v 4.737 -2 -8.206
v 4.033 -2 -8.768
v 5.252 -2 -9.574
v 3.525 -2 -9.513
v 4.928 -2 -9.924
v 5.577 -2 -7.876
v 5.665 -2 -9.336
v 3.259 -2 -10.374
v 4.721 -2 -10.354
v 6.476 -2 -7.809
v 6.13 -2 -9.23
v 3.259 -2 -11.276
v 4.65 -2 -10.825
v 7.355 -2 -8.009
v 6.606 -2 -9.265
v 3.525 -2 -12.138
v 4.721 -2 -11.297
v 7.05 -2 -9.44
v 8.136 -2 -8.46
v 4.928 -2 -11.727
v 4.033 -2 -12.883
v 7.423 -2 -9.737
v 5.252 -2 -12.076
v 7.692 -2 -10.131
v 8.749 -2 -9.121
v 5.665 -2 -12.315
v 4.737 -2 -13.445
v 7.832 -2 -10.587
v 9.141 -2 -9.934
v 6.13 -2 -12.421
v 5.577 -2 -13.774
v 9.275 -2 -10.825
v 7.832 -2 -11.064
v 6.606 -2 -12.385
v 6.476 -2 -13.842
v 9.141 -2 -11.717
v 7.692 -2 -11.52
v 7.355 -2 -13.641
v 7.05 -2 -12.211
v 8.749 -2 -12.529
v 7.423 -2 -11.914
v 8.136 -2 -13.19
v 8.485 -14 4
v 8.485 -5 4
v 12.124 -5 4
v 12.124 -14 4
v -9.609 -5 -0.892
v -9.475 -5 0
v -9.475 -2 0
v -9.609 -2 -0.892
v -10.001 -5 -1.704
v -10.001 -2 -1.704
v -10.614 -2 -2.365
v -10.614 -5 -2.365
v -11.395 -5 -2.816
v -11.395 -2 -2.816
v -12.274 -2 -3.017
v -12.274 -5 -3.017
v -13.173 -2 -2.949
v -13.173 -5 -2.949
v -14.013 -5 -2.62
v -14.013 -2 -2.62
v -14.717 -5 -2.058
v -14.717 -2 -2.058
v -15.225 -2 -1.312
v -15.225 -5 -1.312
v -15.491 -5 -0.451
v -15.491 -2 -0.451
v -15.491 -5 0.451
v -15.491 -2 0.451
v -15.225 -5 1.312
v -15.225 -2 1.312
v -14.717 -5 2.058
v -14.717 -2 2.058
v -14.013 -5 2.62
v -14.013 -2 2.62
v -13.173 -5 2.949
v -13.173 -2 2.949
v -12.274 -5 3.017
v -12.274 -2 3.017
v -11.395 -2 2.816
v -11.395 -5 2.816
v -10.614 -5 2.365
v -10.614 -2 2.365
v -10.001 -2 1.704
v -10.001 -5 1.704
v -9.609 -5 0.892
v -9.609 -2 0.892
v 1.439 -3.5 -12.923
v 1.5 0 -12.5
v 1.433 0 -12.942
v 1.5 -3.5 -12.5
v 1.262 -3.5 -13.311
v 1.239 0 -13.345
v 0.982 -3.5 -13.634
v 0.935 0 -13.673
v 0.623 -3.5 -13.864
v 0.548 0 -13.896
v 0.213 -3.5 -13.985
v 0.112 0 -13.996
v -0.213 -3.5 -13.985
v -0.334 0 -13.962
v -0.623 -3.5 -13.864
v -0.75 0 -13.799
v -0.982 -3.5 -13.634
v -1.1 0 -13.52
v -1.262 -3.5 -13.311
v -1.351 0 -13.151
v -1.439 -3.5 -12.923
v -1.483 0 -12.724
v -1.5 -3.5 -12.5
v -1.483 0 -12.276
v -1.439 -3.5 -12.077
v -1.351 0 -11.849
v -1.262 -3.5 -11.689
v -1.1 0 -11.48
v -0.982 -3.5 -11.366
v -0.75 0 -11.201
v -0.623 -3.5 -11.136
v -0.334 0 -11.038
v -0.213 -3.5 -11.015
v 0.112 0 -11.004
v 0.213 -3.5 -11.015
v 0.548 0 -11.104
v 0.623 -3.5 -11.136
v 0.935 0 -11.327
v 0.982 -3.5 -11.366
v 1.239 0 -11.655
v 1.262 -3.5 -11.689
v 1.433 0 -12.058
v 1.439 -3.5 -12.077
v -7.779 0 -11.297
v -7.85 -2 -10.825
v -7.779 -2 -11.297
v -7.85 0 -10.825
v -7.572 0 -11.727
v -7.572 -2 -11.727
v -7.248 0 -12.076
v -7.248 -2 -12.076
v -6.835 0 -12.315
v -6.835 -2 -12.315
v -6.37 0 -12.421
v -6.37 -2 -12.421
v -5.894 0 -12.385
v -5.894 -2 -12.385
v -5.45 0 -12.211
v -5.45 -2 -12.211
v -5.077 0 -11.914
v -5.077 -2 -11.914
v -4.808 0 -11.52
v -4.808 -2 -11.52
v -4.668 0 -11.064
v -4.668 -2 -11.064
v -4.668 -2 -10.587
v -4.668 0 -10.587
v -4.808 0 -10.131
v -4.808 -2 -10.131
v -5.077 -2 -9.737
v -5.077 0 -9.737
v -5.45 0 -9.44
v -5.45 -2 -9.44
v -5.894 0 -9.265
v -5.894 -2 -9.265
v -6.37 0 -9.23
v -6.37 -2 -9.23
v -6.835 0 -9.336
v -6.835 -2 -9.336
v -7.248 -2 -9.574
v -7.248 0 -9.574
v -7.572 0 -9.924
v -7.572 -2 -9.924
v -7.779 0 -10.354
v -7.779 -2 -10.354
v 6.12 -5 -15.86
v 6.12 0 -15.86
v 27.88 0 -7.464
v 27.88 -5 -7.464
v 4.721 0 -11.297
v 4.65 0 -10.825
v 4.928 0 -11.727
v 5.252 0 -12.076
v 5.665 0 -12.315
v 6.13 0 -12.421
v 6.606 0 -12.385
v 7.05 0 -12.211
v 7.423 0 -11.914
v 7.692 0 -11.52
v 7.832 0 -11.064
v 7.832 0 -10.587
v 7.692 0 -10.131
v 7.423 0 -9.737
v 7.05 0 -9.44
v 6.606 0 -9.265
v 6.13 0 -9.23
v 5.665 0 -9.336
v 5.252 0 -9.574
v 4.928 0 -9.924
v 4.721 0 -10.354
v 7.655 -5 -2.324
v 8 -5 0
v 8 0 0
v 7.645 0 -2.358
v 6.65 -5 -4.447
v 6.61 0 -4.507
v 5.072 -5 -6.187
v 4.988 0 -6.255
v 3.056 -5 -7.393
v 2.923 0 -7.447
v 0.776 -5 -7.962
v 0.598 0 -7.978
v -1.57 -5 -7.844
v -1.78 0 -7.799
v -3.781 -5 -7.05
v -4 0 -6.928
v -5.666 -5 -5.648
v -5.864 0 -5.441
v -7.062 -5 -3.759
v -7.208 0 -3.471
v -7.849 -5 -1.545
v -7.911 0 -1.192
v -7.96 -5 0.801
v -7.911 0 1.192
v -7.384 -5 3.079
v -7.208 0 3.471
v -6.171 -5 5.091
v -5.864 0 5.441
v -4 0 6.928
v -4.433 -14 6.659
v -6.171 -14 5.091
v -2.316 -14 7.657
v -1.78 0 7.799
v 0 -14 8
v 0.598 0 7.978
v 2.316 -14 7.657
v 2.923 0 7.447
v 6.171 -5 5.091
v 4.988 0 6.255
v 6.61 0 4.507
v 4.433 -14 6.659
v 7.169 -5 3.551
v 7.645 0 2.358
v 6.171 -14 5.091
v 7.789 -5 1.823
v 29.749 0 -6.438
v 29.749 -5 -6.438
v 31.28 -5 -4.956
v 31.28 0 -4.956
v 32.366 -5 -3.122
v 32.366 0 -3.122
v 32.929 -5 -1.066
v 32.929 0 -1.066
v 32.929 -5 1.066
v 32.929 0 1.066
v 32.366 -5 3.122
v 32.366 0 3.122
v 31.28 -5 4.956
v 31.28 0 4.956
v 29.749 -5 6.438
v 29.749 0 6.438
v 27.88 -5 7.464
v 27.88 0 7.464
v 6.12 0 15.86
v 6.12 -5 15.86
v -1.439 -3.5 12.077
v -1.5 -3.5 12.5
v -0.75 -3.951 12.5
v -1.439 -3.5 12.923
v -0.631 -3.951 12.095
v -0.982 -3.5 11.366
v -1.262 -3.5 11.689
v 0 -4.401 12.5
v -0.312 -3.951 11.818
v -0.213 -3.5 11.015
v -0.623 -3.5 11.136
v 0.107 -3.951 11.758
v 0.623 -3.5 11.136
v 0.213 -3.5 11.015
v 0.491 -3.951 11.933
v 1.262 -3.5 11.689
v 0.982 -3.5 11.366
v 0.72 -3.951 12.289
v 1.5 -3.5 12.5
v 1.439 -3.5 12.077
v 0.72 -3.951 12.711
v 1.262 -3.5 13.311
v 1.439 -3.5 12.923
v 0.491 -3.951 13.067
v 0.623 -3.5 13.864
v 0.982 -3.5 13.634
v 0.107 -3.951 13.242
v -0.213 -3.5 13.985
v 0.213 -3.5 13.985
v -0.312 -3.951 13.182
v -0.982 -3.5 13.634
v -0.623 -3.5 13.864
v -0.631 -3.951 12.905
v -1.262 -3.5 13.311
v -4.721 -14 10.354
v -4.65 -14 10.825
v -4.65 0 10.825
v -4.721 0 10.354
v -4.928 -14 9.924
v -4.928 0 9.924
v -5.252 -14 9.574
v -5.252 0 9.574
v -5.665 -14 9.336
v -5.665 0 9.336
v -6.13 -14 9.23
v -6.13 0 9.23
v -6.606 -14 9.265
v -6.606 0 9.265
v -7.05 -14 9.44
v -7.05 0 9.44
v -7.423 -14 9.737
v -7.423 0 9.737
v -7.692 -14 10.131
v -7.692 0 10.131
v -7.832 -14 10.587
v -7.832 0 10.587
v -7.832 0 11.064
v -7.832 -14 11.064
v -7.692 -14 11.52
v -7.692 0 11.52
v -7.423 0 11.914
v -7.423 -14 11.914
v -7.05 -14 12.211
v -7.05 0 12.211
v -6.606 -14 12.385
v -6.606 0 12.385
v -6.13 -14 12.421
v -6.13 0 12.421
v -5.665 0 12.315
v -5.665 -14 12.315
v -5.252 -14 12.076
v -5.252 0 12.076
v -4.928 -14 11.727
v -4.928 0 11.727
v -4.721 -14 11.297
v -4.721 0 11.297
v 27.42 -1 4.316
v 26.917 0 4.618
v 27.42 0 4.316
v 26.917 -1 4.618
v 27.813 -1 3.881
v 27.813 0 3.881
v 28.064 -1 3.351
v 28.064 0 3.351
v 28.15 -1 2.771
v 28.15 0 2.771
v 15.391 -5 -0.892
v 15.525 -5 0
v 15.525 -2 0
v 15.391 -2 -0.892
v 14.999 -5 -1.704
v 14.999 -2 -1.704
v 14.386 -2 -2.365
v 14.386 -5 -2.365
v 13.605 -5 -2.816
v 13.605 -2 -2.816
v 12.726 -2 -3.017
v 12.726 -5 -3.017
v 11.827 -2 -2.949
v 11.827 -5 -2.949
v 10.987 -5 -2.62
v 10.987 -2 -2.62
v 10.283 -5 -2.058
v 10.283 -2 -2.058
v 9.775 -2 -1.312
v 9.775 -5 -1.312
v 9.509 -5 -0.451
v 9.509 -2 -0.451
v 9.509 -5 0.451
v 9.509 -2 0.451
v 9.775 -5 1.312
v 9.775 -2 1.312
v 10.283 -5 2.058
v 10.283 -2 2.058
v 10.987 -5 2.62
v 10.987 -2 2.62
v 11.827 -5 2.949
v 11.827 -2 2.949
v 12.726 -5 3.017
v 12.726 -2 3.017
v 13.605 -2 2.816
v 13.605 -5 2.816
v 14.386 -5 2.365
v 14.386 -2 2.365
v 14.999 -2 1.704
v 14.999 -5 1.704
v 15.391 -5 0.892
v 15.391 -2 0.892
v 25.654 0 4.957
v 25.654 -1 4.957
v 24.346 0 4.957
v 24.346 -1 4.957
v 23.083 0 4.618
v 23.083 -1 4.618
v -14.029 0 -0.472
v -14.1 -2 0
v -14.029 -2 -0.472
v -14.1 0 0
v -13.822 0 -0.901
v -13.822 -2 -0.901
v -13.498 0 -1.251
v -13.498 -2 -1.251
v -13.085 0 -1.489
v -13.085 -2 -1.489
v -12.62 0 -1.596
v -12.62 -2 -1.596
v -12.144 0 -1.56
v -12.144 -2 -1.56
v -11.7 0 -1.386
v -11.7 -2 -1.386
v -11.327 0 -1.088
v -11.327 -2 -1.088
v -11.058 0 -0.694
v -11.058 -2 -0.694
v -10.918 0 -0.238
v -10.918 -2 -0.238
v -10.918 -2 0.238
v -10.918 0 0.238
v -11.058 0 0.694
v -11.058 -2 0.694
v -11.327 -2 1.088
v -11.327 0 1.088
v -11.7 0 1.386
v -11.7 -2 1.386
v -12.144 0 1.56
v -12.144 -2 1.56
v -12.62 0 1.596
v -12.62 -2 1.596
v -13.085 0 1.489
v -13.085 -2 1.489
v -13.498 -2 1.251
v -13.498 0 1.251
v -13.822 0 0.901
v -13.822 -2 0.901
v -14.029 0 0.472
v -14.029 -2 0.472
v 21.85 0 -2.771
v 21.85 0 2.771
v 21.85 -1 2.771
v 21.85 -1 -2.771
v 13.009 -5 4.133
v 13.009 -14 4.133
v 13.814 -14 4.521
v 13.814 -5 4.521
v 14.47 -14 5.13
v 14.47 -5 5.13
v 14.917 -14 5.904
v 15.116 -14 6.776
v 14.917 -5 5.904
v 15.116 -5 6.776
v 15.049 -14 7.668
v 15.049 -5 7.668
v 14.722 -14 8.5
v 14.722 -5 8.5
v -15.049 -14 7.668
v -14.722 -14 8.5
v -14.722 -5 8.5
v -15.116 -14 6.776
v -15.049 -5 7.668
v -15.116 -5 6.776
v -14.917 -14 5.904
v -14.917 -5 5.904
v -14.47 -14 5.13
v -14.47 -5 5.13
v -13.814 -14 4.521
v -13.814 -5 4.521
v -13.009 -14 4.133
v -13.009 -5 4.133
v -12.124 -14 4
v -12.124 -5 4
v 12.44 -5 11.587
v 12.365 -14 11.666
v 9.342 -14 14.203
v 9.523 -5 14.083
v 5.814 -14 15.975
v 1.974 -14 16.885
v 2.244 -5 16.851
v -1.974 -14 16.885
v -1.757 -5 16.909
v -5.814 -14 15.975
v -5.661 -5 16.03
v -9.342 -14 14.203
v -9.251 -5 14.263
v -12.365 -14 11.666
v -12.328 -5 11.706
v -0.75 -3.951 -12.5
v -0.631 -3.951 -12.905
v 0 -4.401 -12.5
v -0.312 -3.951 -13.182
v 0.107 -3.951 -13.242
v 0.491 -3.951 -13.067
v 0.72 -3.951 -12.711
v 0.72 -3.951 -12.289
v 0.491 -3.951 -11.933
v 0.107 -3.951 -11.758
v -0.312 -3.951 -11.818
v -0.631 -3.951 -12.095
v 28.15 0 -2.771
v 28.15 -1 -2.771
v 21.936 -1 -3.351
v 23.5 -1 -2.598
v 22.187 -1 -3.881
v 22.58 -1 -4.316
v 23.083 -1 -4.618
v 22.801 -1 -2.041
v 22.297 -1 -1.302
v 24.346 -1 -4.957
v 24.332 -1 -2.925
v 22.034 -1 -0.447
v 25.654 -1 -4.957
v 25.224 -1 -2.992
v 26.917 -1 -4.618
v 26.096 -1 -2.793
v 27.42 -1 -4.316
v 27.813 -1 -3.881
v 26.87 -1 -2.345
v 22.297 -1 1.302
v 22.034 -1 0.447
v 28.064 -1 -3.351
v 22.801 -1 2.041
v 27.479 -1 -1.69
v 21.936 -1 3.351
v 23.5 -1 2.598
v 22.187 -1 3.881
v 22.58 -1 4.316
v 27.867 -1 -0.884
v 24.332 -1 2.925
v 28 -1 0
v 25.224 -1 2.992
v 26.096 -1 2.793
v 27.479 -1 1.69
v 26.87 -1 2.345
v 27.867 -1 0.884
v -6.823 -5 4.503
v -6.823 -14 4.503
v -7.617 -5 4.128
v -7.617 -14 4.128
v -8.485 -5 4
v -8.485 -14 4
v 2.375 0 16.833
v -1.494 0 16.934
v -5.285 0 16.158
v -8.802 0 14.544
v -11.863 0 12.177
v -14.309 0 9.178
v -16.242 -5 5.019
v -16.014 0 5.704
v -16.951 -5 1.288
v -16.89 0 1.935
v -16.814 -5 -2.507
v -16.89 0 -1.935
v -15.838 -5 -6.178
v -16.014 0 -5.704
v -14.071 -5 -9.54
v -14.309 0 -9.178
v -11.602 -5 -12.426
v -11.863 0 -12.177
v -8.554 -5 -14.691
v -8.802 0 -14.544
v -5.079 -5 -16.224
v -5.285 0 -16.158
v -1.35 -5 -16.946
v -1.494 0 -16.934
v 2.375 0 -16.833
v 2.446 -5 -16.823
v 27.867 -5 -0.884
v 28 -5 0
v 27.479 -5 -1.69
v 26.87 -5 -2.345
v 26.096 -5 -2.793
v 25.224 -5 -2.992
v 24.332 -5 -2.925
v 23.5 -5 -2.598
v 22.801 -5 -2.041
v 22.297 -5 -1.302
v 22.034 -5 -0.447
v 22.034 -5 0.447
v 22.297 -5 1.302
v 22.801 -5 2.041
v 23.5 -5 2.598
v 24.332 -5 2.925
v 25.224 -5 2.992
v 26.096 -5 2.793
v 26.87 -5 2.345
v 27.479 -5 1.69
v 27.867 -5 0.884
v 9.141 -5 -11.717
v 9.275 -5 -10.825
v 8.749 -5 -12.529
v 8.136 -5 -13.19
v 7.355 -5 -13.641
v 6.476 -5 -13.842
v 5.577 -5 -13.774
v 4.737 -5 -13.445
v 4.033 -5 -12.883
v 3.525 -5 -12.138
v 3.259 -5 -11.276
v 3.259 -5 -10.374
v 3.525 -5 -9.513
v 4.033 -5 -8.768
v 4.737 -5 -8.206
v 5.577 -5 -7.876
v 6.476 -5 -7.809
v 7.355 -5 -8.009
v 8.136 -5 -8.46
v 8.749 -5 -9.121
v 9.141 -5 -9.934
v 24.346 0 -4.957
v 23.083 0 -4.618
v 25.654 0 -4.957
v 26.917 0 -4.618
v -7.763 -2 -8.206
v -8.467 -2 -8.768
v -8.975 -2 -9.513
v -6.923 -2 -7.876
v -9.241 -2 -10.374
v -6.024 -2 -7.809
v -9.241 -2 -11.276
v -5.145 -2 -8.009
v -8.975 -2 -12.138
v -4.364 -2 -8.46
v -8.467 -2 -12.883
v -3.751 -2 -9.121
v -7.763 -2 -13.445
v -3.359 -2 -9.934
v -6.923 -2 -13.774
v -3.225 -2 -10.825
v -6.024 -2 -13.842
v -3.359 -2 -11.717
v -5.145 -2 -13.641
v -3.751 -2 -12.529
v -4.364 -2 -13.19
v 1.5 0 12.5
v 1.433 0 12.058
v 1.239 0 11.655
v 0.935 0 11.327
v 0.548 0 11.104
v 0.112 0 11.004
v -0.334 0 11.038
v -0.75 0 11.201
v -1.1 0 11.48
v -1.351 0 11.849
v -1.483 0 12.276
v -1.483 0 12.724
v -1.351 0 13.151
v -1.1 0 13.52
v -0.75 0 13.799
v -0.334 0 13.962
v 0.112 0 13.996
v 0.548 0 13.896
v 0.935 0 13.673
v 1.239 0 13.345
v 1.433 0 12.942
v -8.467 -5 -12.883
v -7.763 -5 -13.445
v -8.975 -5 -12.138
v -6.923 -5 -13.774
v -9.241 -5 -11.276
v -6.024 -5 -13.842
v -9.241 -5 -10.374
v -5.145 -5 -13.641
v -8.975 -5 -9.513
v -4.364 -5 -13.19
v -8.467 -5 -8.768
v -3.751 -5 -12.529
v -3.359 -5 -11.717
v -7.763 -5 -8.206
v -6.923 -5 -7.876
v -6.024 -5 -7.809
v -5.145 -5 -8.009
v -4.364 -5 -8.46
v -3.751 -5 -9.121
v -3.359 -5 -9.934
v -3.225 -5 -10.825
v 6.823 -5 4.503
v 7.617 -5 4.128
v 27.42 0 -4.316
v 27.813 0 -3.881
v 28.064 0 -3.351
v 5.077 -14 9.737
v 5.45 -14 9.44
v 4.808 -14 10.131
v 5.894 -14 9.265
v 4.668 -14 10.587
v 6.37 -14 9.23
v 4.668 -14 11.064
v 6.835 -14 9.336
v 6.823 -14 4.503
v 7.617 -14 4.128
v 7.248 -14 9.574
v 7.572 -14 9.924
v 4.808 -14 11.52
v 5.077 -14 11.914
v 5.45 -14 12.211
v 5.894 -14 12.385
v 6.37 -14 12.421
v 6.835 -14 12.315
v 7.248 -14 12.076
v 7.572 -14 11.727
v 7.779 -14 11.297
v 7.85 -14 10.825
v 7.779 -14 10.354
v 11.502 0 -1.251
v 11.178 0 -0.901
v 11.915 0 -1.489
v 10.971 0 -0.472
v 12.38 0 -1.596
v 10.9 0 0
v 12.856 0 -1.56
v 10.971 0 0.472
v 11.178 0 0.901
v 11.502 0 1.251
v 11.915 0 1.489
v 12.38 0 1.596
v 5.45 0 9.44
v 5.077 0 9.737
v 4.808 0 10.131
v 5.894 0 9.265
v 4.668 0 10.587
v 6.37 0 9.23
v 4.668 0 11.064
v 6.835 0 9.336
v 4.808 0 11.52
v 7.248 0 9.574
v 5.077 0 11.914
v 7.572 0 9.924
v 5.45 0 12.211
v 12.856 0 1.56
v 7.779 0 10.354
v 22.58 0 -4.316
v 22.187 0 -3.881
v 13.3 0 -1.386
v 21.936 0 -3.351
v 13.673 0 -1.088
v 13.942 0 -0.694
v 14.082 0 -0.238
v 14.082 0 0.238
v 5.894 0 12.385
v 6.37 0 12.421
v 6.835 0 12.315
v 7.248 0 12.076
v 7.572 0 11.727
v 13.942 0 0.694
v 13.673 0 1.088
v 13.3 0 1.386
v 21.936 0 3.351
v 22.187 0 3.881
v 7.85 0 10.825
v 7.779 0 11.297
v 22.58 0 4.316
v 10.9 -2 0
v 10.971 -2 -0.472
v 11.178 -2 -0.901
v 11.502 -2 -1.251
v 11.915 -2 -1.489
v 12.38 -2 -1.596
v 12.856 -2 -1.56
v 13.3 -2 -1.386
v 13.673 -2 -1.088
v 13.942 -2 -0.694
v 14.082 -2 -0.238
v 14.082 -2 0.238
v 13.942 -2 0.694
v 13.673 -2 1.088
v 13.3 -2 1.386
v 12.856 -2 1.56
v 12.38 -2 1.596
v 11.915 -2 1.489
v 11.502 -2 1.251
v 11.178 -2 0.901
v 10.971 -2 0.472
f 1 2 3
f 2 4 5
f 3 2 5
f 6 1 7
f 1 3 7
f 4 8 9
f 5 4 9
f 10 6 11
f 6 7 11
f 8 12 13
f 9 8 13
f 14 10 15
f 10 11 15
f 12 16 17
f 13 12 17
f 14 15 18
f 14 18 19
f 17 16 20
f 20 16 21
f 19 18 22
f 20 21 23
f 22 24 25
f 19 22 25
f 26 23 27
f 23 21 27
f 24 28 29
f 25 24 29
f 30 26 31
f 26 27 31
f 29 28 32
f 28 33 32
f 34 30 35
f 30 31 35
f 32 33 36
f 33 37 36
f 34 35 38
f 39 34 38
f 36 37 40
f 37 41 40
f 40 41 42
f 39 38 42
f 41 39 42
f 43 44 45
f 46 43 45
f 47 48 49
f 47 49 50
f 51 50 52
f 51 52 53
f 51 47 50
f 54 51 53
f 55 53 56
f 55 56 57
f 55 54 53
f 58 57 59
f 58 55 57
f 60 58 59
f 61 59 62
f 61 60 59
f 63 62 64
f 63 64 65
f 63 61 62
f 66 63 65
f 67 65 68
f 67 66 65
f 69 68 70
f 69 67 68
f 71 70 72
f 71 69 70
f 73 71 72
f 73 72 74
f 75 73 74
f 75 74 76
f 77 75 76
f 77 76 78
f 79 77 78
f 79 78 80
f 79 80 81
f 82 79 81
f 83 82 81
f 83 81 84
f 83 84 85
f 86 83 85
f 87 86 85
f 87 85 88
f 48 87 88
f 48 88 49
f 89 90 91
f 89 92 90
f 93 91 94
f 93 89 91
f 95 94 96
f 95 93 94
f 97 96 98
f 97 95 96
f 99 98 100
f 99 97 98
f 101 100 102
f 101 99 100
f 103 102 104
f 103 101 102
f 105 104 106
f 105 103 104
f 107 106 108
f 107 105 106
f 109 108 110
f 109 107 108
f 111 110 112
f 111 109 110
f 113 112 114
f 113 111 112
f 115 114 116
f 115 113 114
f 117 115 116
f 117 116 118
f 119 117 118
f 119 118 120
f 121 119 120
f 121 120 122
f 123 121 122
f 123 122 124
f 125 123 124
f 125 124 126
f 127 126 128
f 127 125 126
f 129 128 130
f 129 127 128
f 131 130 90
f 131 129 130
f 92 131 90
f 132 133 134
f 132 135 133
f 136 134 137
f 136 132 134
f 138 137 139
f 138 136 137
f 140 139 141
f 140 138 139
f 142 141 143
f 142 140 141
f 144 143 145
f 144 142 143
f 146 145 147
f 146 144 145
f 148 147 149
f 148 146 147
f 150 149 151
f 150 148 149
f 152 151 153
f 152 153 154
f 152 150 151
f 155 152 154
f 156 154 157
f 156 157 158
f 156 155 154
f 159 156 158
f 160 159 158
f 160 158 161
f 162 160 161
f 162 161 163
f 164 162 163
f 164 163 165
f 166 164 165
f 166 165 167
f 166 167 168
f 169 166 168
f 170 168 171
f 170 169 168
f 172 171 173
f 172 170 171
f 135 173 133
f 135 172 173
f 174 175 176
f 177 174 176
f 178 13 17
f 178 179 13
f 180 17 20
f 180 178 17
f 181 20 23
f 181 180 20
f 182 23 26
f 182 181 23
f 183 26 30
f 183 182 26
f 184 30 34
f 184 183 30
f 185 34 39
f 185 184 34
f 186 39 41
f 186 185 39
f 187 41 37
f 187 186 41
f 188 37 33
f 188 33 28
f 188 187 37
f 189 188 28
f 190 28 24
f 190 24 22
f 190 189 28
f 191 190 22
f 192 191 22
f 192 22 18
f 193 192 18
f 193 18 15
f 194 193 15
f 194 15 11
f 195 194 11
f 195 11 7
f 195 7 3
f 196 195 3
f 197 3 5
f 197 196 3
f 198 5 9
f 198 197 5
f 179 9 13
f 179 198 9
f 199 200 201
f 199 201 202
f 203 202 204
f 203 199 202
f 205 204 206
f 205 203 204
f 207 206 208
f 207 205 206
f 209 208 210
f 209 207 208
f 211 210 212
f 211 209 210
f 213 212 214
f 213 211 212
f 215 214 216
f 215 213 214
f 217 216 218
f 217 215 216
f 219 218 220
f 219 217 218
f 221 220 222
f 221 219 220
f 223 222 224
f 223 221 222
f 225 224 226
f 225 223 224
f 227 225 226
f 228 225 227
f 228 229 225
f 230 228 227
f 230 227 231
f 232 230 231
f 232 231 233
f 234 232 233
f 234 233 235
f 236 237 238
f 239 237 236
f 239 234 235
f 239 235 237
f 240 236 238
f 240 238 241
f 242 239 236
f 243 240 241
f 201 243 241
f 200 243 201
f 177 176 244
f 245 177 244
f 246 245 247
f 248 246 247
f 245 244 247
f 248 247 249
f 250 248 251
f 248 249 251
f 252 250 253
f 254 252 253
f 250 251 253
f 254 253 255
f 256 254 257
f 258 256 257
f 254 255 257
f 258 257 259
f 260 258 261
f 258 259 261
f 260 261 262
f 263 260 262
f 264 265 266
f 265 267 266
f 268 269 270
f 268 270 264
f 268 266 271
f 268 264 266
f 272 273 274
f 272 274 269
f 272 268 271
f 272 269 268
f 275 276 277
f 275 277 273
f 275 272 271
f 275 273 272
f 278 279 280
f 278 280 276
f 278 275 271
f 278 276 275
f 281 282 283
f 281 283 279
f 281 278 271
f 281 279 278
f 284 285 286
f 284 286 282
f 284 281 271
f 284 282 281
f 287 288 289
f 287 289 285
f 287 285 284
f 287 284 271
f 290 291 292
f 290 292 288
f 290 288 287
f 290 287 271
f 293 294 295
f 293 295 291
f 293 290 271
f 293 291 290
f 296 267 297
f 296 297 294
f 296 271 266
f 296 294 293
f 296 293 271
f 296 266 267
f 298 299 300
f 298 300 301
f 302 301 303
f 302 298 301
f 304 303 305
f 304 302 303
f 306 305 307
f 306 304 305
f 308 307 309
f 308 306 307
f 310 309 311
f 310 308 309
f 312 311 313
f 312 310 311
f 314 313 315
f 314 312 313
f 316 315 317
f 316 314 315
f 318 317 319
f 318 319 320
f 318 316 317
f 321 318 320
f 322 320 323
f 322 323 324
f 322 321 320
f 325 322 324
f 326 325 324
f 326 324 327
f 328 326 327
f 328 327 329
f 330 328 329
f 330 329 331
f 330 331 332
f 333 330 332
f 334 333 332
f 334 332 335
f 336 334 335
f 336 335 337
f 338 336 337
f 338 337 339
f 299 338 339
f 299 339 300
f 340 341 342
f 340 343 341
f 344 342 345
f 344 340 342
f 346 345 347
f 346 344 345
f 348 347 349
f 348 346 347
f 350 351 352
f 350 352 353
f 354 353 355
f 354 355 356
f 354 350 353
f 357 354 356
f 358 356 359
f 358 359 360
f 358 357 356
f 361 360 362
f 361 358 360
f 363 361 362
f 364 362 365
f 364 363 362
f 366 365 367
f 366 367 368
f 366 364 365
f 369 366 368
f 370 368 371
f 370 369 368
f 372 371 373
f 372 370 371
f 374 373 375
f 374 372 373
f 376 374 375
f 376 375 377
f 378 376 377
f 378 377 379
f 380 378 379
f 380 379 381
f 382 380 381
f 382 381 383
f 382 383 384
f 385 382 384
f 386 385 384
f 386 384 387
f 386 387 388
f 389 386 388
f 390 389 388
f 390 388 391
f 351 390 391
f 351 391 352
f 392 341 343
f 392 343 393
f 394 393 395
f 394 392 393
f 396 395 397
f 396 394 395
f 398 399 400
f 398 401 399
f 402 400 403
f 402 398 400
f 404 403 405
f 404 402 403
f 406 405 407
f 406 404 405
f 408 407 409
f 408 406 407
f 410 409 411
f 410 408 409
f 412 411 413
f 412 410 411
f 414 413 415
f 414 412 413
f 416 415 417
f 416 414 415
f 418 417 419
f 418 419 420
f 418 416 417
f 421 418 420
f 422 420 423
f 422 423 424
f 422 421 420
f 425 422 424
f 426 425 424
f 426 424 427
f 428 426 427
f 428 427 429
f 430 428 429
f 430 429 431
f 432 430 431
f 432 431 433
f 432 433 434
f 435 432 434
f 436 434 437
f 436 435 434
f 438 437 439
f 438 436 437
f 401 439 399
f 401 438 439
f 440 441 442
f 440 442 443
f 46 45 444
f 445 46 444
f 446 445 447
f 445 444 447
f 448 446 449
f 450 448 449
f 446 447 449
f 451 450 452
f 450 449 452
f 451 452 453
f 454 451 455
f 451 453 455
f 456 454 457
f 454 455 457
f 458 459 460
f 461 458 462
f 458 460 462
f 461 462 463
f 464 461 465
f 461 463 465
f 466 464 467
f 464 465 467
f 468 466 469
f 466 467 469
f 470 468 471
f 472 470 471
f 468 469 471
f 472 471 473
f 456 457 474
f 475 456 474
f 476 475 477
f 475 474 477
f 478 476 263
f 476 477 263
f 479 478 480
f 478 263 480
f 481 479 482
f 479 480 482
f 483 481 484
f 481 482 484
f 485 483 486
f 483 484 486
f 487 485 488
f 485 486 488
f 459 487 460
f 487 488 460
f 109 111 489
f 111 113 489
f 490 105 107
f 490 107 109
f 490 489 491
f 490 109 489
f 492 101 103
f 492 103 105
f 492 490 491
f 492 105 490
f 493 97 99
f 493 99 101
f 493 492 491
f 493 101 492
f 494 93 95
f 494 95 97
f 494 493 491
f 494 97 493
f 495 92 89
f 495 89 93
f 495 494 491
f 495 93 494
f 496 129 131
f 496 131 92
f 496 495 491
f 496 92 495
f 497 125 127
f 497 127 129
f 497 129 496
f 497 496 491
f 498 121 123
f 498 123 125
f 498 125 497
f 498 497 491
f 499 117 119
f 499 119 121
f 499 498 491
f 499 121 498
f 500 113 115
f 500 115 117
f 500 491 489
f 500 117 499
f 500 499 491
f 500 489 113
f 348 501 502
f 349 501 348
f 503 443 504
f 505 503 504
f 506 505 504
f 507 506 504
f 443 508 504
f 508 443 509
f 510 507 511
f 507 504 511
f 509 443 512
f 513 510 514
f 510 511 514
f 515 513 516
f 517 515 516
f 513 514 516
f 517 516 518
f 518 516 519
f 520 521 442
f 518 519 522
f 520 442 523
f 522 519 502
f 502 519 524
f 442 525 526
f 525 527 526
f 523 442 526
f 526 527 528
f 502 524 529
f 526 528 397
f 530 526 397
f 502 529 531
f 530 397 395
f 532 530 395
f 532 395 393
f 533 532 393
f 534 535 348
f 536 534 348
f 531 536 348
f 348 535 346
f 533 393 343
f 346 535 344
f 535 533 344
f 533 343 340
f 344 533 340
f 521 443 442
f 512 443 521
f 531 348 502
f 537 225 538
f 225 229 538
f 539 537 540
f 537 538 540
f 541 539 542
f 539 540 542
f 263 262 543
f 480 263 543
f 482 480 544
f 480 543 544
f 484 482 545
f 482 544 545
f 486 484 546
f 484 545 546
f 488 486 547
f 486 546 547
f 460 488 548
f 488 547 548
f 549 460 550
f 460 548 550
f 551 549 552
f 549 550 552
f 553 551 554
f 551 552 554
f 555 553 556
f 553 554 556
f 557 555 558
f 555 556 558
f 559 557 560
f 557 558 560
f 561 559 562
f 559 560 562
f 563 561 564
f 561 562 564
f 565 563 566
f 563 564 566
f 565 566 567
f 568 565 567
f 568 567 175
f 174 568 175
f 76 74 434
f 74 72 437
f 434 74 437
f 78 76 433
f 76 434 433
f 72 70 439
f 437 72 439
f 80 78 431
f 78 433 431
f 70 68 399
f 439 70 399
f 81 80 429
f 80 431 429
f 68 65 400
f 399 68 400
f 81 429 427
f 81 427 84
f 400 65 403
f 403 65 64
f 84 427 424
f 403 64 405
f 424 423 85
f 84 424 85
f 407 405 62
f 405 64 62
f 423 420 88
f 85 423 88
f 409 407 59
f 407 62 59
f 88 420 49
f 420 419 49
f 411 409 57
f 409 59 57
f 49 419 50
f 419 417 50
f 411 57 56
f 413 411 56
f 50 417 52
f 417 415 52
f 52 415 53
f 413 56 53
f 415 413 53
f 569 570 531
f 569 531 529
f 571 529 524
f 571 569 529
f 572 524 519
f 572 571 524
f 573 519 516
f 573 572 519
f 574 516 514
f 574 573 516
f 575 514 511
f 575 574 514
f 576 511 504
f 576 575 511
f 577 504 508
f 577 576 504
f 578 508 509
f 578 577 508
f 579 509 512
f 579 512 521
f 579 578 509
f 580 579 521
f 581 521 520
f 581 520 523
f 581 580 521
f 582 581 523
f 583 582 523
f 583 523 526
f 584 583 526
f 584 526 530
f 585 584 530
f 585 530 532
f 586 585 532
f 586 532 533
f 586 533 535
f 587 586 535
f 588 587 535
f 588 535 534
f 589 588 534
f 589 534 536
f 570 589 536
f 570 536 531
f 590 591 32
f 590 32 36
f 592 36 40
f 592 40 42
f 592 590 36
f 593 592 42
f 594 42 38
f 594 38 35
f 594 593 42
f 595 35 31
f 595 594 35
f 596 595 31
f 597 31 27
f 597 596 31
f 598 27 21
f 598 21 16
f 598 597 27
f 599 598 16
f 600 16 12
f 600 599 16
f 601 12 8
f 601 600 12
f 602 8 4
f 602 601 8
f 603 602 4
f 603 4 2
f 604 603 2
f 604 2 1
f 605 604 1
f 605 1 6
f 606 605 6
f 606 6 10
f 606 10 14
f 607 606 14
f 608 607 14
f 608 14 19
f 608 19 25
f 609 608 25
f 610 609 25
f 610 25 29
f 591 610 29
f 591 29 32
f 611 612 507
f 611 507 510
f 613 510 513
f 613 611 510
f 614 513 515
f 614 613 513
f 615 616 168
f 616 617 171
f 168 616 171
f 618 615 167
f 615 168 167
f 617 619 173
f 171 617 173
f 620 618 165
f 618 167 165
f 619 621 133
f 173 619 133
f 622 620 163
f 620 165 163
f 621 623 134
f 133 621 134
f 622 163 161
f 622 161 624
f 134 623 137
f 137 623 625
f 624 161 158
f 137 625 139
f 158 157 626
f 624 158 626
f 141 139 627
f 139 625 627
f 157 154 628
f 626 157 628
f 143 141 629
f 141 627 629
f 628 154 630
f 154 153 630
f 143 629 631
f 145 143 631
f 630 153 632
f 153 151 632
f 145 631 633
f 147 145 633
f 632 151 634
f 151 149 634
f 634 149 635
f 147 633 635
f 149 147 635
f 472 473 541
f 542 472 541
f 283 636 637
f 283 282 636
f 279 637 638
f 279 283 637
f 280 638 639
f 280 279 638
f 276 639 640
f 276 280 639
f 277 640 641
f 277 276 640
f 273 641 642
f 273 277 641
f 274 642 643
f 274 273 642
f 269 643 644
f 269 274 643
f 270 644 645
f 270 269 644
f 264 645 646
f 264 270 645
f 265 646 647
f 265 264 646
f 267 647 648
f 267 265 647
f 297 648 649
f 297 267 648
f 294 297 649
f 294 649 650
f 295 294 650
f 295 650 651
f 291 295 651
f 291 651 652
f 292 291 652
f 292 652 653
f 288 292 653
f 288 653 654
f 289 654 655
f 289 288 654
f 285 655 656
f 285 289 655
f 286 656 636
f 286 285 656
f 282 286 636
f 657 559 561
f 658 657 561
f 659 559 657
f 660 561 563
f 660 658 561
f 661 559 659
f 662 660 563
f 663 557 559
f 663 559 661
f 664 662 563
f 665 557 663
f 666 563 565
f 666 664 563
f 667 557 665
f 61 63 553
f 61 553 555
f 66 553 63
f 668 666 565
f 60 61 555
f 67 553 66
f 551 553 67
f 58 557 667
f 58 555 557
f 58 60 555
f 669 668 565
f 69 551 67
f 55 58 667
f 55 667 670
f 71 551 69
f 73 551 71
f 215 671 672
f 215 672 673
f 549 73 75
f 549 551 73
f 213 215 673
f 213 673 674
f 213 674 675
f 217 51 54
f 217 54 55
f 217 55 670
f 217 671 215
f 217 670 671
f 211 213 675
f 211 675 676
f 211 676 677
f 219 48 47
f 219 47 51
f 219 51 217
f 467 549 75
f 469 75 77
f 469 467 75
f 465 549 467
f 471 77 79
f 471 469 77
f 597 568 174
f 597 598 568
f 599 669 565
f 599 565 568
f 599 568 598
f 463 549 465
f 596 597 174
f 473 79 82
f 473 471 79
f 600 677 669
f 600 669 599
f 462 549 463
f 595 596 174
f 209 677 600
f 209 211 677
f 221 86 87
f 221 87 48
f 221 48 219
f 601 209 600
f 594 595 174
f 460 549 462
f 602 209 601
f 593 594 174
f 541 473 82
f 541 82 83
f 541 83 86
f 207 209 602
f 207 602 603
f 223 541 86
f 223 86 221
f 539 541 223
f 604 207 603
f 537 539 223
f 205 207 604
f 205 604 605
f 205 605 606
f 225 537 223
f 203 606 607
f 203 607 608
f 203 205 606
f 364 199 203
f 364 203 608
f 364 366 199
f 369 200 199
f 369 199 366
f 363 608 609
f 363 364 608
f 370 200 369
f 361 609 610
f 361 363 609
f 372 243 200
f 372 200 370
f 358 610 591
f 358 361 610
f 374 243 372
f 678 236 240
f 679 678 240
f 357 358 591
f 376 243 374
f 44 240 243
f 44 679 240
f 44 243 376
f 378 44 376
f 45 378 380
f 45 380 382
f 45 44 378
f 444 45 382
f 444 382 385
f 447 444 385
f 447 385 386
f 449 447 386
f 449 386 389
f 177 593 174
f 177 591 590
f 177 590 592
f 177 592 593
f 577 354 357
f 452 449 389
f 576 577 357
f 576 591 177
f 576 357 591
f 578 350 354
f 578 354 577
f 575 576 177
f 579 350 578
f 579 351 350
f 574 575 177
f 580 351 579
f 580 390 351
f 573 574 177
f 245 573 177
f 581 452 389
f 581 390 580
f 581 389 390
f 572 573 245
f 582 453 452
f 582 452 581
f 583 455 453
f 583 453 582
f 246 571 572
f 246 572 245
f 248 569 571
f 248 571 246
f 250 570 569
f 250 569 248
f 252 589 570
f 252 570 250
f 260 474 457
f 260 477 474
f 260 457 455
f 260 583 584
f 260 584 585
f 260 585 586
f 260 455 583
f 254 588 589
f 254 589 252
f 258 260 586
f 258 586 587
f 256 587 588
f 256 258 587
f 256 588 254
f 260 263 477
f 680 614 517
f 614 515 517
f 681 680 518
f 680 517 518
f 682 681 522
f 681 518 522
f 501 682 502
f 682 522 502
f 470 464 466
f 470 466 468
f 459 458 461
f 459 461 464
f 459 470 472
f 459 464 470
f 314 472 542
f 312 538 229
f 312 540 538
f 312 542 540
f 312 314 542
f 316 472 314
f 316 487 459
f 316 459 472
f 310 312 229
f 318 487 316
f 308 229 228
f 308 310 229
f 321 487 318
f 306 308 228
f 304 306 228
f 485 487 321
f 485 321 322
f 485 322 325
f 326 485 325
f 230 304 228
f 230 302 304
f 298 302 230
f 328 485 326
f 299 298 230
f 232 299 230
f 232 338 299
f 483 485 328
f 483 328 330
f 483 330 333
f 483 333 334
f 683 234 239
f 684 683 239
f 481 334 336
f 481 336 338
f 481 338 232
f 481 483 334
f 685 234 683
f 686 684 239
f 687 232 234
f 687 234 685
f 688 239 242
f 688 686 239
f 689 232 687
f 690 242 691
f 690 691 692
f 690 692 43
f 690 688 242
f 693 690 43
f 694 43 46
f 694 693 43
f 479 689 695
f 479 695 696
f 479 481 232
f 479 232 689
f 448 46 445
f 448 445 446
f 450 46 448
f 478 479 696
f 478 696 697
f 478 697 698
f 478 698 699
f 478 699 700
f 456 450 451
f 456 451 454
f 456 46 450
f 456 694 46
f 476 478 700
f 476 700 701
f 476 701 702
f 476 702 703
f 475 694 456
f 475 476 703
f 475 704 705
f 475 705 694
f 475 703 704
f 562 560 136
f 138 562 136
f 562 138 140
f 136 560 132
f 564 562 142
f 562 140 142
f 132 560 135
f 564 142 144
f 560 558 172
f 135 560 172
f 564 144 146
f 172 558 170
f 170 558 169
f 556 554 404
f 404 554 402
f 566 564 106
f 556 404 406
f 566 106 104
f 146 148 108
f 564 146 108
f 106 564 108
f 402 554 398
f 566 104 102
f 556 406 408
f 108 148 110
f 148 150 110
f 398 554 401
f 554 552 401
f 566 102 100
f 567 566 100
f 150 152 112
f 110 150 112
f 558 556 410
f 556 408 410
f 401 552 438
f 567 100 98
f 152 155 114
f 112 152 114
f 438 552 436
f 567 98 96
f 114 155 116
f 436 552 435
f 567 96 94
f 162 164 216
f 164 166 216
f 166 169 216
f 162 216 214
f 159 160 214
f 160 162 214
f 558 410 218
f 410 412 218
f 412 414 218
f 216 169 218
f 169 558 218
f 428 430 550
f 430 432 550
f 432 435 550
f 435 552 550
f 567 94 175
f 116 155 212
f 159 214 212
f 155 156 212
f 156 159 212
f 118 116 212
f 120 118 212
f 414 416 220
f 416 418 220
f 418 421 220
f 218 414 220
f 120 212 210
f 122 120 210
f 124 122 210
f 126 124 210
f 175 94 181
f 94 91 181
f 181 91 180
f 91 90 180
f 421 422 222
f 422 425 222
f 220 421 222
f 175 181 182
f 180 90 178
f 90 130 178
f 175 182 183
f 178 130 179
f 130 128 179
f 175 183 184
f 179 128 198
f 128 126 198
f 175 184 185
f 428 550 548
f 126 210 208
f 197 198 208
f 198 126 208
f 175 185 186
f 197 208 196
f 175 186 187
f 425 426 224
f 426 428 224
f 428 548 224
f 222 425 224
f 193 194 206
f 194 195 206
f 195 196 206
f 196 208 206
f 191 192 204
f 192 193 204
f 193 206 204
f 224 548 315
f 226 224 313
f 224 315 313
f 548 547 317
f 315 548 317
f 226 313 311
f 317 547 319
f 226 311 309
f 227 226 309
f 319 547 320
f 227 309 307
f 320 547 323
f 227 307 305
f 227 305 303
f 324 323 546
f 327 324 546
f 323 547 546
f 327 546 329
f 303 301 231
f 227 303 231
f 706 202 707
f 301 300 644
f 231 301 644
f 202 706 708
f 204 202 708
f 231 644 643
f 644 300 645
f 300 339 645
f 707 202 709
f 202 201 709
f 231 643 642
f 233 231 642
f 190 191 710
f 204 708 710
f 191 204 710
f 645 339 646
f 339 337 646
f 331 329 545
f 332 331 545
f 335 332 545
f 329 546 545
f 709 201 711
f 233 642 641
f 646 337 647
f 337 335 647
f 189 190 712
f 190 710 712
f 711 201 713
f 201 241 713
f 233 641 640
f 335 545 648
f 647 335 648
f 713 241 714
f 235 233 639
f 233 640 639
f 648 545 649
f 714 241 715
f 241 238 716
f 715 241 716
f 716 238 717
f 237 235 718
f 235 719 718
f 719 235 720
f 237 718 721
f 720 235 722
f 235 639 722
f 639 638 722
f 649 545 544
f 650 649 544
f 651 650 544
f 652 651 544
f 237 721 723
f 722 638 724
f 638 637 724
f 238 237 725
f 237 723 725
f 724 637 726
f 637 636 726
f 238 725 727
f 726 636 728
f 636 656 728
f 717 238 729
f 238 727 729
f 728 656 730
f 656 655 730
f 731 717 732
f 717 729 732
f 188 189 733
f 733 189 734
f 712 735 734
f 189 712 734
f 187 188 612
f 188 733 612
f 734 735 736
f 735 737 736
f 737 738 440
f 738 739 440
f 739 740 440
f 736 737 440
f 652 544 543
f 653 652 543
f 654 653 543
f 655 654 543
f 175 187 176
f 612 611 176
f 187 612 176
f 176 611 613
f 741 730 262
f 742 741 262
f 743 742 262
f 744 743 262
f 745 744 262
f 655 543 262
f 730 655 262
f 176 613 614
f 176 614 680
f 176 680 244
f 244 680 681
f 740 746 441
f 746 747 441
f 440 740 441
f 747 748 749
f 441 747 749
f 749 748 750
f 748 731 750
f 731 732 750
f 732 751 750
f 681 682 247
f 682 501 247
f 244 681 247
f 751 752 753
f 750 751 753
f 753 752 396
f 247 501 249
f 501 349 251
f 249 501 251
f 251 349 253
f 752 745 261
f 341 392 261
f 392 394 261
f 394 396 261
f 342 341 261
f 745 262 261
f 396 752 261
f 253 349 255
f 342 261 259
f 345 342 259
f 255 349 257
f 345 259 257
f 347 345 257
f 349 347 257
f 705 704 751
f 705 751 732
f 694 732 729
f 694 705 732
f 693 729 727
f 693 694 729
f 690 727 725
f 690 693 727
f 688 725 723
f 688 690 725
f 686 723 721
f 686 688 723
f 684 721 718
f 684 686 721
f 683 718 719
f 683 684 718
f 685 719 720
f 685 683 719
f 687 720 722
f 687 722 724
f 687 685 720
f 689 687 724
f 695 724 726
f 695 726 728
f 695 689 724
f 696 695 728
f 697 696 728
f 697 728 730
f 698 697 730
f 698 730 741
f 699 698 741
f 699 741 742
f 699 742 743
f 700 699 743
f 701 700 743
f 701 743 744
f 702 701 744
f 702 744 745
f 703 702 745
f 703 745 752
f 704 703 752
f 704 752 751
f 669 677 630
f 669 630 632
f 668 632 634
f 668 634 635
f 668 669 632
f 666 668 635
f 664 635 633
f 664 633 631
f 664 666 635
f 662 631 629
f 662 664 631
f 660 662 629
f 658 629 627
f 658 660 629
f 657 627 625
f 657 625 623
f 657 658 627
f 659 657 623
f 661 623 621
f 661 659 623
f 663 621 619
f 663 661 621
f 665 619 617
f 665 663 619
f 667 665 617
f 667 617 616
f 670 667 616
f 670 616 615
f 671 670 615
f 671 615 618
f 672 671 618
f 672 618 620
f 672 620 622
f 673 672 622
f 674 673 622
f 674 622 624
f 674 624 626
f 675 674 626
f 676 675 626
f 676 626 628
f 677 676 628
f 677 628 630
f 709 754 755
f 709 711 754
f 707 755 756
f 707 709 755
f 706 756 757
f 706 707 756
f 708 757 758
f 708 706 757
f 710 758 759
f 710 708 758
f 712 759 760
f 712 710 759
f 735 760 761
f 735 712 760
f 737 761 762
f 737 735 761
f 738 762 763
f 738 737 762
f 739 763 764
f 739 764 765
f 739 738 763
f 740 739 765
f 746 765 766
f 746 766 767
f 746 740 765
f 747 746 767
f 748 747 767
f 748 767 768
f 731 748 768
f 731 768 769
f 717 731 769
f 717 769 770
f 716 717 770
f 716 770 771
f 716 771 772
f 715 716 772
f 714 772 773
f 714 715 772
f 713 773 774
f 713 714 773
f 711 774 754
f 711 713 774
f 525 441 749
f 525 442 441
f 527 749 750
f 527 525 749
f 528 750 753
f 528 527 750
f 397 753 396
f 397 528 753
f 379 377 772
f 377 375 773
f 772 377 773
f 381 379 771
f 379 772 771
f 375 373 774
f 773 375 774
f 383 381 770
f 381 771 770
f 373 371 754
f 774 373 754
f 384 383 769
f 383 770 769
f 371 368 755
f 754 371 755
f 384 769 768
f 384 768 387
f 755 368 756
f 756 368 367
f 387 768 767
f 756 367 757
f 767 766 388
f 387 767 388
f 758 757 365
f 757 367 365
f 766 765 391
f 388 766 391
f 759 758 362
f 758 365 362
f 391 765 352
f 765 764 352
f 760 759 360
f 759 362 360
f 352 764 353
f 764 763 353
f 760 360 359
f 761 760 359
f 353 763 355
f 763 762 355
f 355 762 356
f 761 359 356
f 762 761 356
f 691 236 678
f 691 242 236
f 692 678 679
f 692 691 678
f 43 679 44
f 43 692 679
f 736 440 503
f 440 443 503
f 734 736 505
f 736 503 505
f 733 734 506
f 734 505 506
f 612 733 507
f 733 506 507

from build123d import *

# Parameters (mm, degrees)
EXTRUDE_1_DEPTH             = 5
EXTRUDE_2_DEPTH             = 9
CUT_EXTRUDE_1_DEPTH         = 1
HOLE_WIZARD_3_0_3_1_D       = 3
HOLE_WIZARD_3_0_3_1_DEPTH   = 3.5
HOLE_WIZARD_3_0_3_1_TIP     = 0.901290929
HOLE_WIZARD_3_0_3_2_D       = 3
HOLE_WIZARD_3_0_3_2_DEPTH   = 3.5
HOLE_WIZARD_3_0_3_2_TIP     = 0.901290929
HOLE_WIZARD_M31_D           = 3.2
HOLE_WIZARD_M31_CBORE_D     = 6.05
HOLE_WIZARD_M31_CBORE_DEPTH = 3
HOLE_WIZARD_16_0_16_1_D     = 16
HOLE_WIZARD_16_0_16_1_DEPTH = 14
HOLE_WIZARD_3_2_3_2_1_D     = 3.2
HOLE_WIZARD_6_0_6_1_D       = 6
HOLE_WIZARD_6_0_6_1_DEPTH   = 13
FILLET_1_R                  = 2
FILLET_2_R                  = 3


with BuildPart() as part:
    # Эскиз1 → Бобышка-Вытянуть1 (new body)
    with BuildSketch(Plane.XZ):
        with BuildLine():
            Line((6.12, -15.860189154), (27.88, -7.463618425))
            ThreePointArc((27.88, -7.463618425), (33, 0), (27.88, 7.463618425))
            Line((27.88, 7.463618425), (6.12, 15.860189154))
            ThreePointArc((6.12, 15.860189154), (-17, 0), (6.12, -15.860189154))
        make_face()
    extrude(amount=-EXTRUDE_1_DEPTH)

    # Эскиз2 → Бобышка-Вытянуть2 (add)
    with BuildSketch(Plane(origin=(0, 5, 0), x_dir=(-1, 0, 0), z_dir=(0, 1, 0))):
        with BuildLine():
            Line((12.124355653, 4), (-12.124355653, 4))
            ThreePointArc((-12.124355653, 4), (-14.722431864, 5.5), (-14.722431864, 8.5))
            ThreePointArc((-14.722431864, 8.5), (0, 17), (14.722431864, 8.5))
            ThreePointArc((14.722431864, 8.5), (14.722431864, 5.5), (12.124355653, 4))
        make_face()
    extrude(amount=EXTRUDE_2_DEPTH)

    # Эскиз3 → Вырез-Вытянуть1 (cut)
    with BuildSketch(Plane.XZ):
        with BuildLine():
            Line((21.85, 3.882975663), (21.85, -3.882975663))
            ThreePointArc((21.85, -3.882975663), (25, -5), (28.15, -3.882975663))
            Line((28.15, -3.882975663), (28.15, 3.882975663))
            ThreePointArc((28.15, 3.882975663), (25, 5), (21.85, 3.882975663))
        make_face()
    extrude(amount=-CUT_EXTRUDE_1_DEPTH, mode=Mode.SUBTRACT)

    # Диаметр отверстия Ø3.0 (3)1
    with Locations(Plane(origin=(0, 0, 0), x_dir=(-1, 0, 0), z_dir=(0, -1, 0))):
        with Locations((0, 12.5)):
            Hole(HOLE_WIZARD_3_0_3_1_D / 2, depth=HOLE_WIZARD_3_0_3_1_DEPTH)
            with Locations((0, 0, -(HOLE_WIZARD_3_0_3_1_DEPTH + HOLE_WIZARD_3_0_3_1_TIP / 2))):  # 118° drill point
                Cone(0, HOLE_WIZARD_3_0_3_1_D / 2, HOLE_WIZARD_3_0_3_1_TIP, mode=Mode.SUBTRACT)

    # Диаметр отверстия Ø3.0 (3)2
    with Locations(Plane(origin=(0, 0, 0), x_dir=(-1, 0, 0), z_dir=(0, -1, 0))):
        with Locations((0, -12.5)):
            Hole(HOLE_WIZARD_3_0_3_2_D / 2, depth=HOLE_WIZARD_3_0_3_2_DEPTH)
            with Locations((0, 0, -(HOLE_WIZARD_3_0_3_2_DEPTH + HOLE_WIZARD_3_0_3_2_TIP / 2))):  # 118° drill point
                Cone(0, HOLE_WIZARD_3_0_3_2_D / 2, HOLE_WIZARD_3_0_3_2_TIP, mode=Mode.SUBTRACT)

    # Цековка для винта с заклепочной головкой M31 (through all)
    with Locations(Plane(origin=(0, 5, 0), x_dir=(1, 0, 0), z_dir=(0, 1, 0))):
        with Locations((12.5, 0), (6.25, 10.825317547), (-6.25, 10.825317547), (-12.5, 0)):
            CounterBoreHole(HOLE_WIZARD_M31_D / 2, HOLE_WIZARD_M31_CBORE_D / 2, HOLE_WIZARD_M31_CBORE_DEPTH)

    # Диаметр отверстия Ø16.0 (16)1
    with Locations(Plane(origin=(0, 0, 0), x_dir=(-1, 0, 0), z_dir=(0, -1, 0))):
        with Locations((0, 0)):
            Hole(HOLE_WIZARD_16_0_16_1_D / 2, depth=HOLE_WIZARD_16_0_16_1_DEPTH)

    # Диаметр отверстия Ø3.2 (3.2)1 (through all)
    with Locations(Plane(origin=(0, 0, 0), x_dir=(-1, 0, 0), z_dir=(0, -1, 0))):
        with Locations((6.25, -10.825317547), (-6.25, -10.825317547)):
            Hole(HOLE_WIZARD_3_2_3_2_1_D / 2)

    # Диаметр отверстия Ø6.0 (6)1
    with Locations(Plane(origin=(0, 1, 0), x_dir=(-1, 0, 0), z_dir=(0, -1, 0))):
        with Locations((-25, 0)):
            Hole(HOLE_WIZARD_6_0_6_1_D / 2, depth=HOLE_WIZARD_6_0_6_1_DEPTH)

    # Скругление1
    fillet_1_edges = [part.edges().sort_by_distance(p)[0] for p in [
        (21.85, 0.5, 3.882975663),
        (28.15, 0.5, 3.882975663),
        (28.15, 0.5, -3.882975663),
        (21.85, 0.5, -3.882975663),
    ]]
    fillet(fillet_1_edges, radius=FILLET_1_R)

    # Скругление2
    fillet_2_edges = [part.edges().sort_by_distance(p)[0] for p in [
        (6.92820323, 9.5, 4),
        (-6.92820323, 9.5, 4),
    ]]
    fillet(fillet_2_edges, radius=FILLET_2_R)


with BuildPart() as body_2:
    # Зеркальное отражение1: mirrored copy
    add(part.part.mirror(Plane(origin=(0, 0, 0), x_dir=(0, 0, 1), z_dir=(0, -1, 0))))


solid = body_2.part
